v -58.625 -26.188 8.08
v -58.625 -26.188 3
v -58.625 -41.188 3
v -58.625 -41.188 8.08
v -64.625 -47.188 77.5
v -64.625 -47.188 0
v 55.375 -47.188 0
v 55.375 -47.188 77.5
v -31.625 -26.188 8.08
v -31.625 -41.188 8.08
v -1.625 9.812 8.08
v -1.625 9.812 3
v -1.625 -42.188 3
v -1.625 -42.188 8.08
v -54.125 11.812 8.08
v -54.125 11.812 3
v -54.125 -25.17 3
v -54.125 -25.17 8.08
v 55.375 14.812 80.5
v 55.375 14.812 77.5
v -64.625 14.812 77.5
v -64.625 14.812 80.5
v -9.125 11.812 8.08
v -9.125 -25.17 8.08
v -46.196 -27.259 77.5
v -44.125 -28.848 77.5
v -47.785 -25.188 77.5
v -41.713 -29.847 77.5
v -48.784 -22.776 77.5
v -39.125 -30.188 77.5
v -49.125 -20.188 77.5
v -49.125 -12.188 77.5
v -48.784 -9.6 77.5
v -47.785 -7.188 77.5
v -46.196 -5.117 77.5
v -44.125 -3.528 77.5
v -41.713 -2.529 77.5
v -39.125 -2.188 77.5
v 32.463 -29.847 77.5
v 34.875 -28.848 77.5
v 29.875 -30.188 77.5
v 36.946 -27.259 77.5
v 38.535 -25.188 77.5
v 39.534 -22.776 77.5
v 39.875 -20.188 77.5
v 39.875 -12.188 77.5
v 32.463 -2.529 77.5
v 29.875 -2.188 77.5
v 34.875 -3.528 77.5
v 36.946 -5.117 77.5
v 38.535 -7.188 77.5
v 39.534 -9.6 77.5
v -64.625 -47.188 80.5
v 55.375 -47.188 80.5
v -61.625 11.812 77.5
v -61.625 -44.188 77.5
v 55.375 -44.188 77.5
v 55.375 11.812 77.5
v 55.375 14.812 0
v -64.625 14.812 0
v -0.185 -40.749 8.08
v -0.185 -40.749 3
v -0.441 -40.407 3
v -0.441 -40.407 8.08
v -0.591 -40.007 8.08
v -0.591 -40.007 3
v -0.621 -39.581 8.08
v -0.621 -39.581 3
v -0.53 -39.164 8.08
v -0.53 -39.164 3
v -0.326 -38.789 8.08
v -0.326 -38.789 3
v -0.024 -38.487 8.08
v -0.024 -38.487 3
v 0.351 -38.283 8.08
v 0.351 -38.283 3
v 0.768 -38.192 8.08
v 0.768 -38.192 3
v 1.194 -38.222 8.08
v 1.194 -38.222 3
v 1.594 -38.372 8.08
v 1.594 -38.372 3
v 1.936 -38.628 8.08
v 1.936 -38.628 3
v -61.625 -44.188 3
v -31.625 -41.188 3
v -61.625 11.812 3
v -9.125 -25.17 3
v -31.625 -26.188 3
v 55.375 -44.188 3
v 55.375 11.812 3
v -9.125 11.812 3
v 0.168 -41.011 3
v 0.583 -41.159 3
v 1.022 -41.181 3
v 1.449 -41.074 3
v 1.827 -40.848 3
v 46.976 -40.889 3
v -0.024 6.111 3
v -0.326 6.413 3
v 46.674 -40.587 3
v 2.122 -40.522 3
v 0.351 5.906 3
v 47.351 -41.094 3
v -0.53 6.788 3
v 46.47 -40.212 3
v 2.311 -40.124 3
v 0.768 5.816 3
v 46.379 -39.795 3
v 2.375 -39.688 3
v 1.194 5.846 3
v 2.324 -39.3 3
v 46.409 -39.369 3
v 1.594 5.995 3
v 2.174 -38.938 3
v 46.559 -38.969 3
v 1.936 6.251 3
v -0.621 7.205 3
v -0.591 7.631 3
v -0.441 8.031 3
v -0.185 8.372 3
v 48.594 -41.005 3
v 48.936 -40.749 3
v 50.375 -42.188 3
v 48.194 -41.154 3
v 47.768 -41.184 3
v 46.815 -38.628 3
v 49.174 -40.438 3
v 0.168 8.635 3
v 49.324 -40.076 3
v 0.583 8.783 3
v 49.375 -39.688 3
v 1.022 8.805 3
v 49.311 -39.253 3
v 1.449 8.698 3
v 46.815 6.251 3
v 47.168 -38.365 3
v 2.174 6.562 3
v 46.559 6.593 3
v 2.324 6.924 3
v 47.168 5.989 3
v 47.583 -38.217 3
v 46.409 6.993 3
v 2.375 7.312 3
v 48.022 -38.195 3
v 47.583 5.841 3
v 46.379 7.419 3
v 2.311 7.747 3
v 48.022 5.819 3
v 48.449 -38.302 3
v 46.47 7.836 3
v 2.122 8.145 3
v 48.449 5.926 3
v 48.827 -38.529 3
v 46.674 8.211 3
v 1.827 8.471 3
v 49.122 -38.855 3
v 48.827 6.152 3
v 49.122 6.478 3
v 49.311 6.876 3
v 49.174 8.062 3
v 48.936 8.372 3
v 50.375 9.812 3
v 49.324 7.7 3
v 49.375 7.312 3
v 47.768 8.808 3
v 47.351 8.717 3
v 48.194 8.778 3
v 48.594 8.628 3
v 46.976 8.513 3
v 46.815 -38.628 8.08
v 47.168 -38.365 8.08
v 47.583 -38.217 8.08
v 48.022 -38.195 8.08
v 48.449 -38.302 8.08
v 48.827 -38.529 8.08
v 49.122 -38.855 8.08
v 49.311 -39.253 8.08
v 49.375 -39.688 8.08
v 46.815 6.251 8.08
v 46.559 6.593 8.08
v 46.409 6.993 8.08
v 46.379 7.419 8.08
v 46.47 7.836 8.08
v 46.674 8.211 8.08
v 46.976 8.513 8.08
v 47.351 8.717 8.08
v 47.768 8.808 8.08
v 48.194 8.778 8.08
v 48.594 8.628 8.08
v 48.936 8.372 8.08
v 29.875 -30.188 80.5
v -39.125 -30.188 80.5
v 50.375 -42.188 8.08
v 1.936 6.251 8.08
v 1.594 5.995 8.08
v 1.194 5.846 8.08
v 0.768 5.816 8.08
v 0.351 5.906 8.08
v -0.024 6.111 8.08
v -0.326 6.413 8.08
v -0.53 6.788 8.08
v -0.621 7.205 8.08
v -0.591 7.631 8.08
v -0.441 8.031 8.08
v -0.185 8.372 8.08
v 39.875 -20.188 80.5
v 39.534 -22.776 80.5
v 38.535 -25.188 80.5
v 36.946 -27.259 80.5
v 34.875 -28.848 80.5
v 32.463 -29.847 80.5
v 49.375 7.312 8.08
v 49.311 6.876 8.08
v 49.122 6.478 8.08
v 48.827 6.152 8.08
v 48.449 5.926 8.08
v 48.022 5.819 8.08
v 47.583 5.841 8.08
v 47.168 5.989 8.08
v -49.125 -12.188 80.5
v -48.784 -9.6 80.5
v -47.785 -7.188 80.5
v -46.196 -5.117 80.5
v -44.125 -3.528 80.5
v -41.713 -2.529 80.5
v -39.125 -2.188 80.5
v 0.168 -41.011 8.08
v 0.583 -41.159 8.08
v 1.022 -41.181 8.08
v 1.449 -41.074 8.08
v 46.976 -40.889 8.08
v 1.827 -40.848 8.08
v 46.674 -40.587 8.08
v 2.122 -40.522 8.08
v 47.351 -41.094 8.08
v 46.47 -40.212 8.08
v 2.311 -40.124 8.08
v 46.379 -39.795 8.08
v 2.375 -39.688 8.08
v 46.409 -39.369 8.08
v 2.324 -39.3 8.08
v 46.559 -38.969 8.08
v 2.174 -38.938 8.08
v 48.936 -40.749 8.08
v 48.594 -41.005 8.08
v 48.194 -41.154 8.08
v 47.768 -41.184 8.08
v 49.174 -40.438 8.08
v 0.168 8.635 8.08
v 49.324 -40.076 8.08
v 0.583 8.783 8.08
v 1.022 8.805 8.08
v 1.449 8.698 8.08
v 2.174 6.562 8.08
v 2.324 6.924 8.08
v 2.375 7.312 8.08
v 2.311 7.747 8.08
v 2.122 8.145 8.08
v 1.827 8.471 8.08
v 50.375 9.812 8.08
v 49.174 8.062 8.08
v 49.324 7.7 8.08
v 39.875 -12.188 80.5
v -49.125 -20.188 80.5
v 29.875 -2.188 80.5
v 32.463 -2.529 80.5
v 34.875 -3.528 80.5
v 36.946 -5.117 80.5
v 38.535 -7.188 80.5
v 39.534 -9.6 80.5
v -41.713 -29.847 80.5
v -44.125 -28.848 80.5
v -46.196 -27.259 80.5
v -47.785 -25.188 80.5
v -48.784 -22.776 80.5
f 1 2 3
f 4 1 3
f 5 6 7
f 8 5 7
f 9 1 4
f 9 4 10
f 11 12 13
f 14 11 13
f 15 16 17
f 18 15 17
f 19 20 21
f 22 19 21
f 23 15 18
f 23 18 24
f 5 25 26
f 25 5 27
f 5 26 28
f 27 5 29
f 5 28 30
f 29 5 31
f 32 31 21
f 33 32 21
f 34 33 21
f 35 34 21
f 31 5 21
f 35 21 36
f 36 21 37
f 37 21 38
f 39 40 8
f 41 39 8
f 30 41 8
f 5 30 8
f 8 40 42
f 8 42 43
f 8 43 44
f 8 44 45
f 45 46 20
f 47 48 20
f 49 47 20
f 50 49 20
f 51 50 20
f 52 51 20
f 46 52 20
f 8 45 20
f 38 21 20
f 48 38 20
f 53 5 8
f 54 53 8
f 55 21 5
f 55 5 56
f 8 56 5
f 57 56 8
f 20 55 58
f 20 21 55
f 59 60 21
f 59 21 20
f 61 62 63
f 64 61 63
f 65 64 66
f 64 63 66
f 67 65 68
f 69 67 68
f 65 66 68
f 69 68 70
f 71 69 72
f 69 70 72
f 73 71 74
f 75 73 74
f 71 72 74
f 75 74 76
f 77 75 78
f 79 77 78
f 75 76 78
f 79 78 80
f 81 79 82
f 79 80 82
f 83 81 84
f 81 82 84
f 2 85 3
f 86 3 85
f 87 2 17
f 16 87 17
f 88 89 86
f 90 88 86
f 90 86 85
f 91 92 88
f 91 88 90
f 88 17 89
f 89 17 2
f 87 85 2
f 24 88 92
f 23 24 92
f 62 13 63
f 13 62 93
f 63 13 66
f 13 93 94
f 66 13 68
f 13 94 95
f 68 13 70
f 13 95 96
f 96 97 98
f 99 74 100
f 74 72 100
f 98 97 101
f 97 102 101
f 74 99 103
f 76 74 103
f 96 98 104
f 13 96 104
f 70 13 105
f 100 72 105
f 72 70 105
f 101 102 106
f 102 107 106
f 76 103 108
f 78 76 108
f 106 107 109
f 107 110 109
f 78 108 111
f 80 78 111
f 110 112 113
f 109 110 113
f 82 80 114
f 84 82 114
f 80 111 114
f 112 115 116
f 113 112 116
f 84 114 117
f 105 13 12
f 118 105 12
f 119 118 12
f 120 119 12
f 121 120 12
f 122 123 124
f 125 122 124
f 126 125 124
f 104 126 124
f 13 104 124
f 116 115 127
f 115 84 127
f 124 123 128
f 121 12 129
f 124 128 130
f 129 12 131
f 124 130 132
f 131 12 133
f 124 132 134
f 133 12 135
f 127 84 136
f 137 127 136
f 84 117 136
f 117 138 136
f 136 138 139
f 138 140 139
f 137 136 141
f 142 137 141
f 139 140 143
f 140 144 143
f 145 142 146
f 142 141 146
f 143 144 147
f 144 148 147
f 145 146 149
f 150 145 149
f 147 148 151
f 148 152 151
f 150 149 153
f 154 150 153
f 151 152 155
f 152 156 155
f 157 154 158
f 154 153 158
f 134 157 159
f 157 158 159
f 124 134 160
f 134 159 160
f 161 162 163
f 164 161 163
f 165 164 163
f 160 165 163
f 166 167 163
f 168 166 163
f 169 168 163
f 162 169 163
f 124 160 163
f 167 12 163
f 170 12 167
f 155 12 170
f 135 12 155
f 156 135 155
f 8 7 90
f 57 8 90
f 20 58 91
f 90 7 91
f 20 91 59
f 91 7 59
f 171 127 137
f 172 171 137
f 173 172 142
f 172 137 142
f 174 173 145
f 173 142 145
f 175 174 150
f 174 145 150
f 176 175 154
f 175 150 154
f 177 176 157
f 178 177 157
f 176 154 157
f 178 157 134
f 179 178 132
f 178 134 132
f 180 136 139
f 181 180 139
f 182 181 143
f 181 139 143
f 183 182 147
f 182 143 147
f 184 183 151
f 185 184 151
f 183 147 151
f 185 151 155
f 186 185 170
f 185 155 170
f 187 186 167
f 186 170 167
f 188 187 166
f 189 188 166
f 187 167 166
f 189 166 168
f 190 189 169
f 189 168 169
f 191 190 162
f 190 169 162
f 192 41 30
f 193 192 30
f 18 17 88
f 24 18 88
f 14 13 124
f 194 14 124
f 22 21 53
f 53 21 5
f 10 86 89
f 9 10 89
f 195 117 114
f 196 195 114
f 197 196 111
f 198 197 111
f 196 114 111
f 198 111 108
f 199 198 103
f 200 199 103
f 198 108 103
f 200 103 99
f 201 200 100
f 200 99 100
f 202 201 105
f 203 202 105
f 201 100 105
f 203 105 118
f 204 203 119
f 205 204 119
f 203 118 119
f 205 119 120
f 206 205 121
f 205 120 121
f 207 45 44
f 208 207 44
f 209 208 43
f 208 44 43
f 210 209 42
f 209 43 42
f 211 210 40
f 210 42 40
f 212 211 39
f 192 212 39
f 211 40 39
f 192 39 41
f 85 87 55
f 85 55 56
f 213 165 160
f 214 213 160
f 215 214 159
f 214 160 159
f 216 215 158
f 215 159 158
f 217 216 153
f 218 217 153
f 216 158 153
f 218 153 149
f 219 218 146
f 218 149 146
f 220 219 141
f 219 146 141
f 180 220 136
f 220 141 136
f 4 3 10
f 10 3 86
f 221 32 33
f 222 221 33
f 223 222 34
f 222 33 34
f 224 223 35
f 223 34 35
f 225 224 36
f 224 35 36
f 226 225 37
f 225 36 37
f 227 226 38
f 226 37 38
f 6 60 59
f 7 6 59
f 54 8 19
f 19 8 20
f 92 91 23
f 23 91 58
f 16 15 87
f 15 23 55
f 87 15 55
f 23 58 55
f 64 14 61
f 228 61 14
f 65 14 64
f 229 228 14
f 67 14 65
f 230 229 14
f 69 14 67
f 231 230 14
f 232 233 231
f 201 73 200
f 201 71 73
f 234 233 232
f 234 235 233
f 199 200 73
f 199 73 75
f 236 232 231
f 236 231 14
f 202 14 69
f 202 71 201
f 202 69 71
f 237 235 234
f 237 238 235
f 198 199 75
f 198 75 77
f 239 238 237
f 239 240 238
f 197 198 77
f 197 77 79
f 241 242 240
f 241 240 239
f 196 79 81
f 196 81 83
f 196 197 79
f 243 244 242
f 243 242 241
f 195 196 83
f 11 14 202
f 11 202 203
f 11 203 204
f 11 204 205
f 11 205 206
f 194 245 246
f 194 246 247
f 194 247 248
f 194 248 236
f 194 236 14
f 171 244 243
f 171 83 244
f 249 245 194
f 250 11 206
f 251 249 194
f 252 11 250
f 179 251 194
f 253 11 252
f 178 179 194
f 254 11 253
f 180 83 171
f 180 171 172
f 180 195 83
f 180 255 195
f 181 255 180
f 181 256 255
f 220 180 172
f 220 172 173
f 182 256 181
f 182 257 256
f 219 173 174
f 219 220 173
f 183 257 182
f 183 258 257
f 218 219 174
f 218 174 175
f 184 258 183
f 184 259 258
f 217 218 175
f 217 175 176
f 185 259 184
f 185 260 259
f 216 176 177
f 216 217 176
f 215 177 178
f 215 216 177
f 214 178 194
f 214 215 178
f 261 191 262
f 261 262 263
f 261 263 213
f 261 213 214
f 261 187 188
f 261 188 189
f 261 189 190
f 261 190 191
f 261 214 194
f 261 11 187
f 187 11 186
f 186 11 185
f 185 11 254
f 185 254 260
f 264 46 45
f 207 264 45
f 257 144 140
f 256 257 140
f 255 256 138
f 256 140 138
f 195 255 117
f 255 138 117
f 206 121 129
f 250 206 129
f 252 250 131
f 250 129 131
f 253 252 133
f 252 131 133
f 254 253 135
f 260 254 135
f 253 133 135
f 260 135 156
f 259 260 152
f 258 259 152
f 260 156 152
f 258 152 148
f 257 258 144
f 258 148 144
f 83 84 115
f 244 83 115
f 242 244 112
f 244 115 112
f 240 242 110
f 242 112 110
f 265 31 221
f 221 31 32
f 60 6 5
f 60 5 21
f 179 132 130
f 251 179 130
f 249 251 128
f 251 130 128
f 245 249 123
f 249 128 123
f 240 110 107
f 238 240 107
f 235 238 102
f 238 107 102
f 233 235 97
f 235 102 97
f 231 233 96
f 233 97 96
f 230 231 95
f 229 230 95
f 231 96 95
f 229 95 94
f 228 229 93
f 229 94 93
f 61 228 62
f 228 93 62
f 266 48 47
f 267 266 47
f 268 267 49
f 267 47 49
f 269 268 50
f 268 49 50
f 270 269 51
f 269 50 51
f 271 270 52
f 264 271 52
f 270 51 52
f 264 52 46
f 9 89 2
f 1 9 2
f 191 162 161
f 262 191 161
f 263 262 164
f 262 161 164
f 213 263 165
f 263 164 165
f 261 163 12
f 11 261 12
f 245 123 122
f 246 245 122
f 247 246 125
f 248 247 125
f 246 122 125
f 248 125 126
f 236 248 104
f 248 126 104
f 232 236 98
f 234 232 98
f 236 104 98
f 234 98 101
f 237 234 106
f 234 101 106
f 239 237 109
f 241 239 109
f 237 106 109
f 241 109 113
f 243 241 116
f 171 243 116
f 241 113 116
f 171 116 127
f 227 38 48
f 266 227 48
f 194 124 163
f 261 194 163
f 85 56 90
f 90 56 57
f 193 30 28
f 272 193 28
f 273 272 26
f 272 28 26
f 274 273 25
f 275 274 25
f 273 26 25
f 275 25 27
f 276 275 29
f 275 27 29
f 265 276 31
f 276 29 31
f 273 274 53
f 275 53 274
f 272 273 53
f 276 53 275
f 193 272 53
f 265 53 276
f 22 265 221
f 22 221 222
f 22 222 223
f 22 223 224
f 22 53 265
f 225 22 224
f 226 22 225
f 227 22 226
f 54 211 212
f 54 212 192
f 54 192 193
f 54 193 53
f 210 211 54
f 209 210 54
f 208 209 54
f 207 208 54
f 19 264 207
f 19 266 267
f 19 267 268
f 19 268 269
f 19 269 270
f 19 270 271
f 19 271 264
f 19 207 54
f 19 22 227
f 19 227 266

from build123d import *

# Parameters (mm, degrees)
F0_W      = 120
F0_H      = 62
F1_DEPTH  = 77.5
F3_DEPTH  = 74.5
F5_DEPTH  = 3
F7_DEPTH  = 5.08
F9_DEPTH  = 5.08
F11_DEPTH = 5.08


with BuildPart() as f1:
    # F0 (on Top) → F1 (new body)
    with BuildSketch(Plane.XY):
        with Locations((-4.624794, -16.188201)):
            Rectangle(F0_W, F0_H)
    extrude(amount=F1_DEPTH)

    # F2 (on face) → F3 (cut)
    with BuildSketch(Plane.XY.offset(77.5)):
        Polygon((55.375206, -44.188201), (55.375206, 11.811799), (24.783194, 11.811799), (-61.624794, 11.811799), (-61.624794, -16.188201), (-61.624794, -44.188201), (24.551408, -44.188201), align=None)
    extrude(amount=-F3_DEPTH, mode=Mode.SUBTRACT)

    # F8 (on face) → F9 (join)
    with BuildSketch(Plane.XY.offset(3)):
        Polygon((-31.624794, -41.188201), (-31.624794, -26.188201), (-58.624794, -26.188201), (-58.624794, -33.688201), (-58.624794, -41.188201), (-45.124794, -41.188201), align=None)
    extrude(amount=F9_DEPTH)

    # F10 (on face) → F11 (join)
    with BuildSketch(Plane.XY.offset(3)):
        Polygon((-9.124794, -25.16969), (-9.124794, 11.811799), (-54.124794, 11.811799), (-54.124794, -6.66969), (-54.124794, -25.16969), align=None)
    extrude(amount=F11_DEPTH)


with BuildPart() as f5:
    # F4 (on face) → F5 (new body)
    with BuildSketch(Plane.XY.offset(77.5)):
        with BuildLine():
            Line((-21.697029, 14.811799), (-64.624794, 14.811799))
            Line((-64.624794, 14.811799), (-64.624794, -18.261954))
            Line((-64.624794, -18.261954), (-49.124794, -18.261954))
            Line((-49.124794, -18.261954), (-49.124794, -12.188201))
            ThreePointArc((-49.124794, -12.188201), (-46.195862, -5.117134), (-39.124794, -2.188201))
            Line((-39.124794, -2.188201), (-21.697029, -2.188201))
            Line((-21.697029, -2.188201), (-21.697029, 14.811799))
        make_face()
        with BuildLine():
            Line((55.375206, 14.811799), (-21.697029, 14.811799))
            Line((-21.697029, 14.811799), (-21.697029, -2.188201))
            Line((-21.697029, -2.188201), (29.875206, -2.188201))
            ThreePointArc((29.875206, -2.188201), (36.946274, -5.117134), (39.875206, -12.188201))
            Line((39.875206, -12.188201), (39.875206, -18.825031))
            Line((39.875206, -18.825031), (55.375206, -18.825031))
            Line((55.375206, -18.825031), (55.375206, 14.811799))
        make_face()
        with BuildLine():
            Line((55.375206, -47.188201), (55.375206, -18.825031))
            Line((55.375206, -18.825031), (39.875206, -18.825031))
            Line((39.875206, -18.825031), (39.875206, -20.188201))
            ThreePointArc((39.875206, -20.188201), (36.946274, -27.259269), (29.875206, -30.188201))
            Line((29.875206, -30.188201), (-20.468894, -30.188201))
            Line((-20.468894, -30.188201), (-20.468894, -47.188201))
            Line((-20.468894, -47.188201), (55.375206, -47.188201))
        make_face()
        with BuildLine():
            Line((-49.124794, -18.261954), (-64.624794, -18.261954))
            Line((-64.624794, -18.261954), (-64.624794, -47.188201))
            Line((-64.624794, -47.188201), (-20.468894, -47.188201))
            Line((-20.468894, -47.188201), (-20.468894, -30.188201))
            Line((-20.468894, -30.188201), (-39.124794, -30.188201))
            ThreePointArc((-39.124794, -30.188201), (-46.195862, -27.259269), (-49.124794, -20.188201))
            Line((-49.124794, -20.188201), (-49.124794, -18.261954))
        make_face()
    extrude(amount=F5_DEPTH)


with BuildPart() as f7:
    # F6 (on face) → F7 (new body)
    with BuildSketch(Plane.XY.offset(3)):
        with BuildLine():
            Line((50.375206, -13.575806), (50.375206, 9.811799))
            Line((50.375206, 9.811799), (48.935866, 8.372459))
            ThreePointArc((48.935866, 8.372459), (49.261025, 7.885824), (49.375206, 7.311799))
            ThreePointArc((49.375206, 7.311799), (48.449231, 5.925979), (46.814546, 6.251138))
            Line((46.814546, 6.251138), (45.375206, 4.811799))
            Line((45.375206, 4.811799), (45.375206, -37.188201))
            Line((45.375206, -37.188201), (46.814546, -38.627541))
            ThreePointArc((46.814546, -38.627541), (48.449231, -38.302382), (49.375206, -39.688201))
            ThreePointArc((49.375206, -39.688201), (49.261025, -40.262227), (48.935866, -40.748862))
            Line((48.935866, -40.748862), (50.375206, -42.188201))
            Line((50.375206, -42.188201), (50.375206, -13.575806))
        make_face()
        with BuildLine():
            Line((48.935866, 8.372459), (50.375206, 9.811799))
            Line((50.375206, 9.811799), (24.375206, 9.811799))
            Line((24.375206, 9.811799), (-1.624794, 9.811799))
            Line((-1.624794, 9.811799), (-0.185454, 8.372459))
            ThreePointArc((-0.185454, 8.372459), (1.449231, 8.697618), (2.375206, 7.311799))
            ThreePointArc((2.375206, 7.311799), (2.261025, 6.737773), (1.935866, 6.251138))
            Line((1.935866, 6.251138), (3.375206, 4.811799))
            Line((3.375206, 4.811799), (45.375206, 4.811799))
            Line((45.375206, 4.811799), (46.814546, 6.251138))
            ThreePointArc((46.814546, 6.251138), (46.814546, 8.372459), (48.935866, 8.372459))
        make_face()
        with BuildLine():
            Line((-0.185454, 8.372459), (-1.624794, 9.811799))
            Line((-1.624794, 9.811799), (-1.624794, -13.117866))
            Line((-1.624794, -13.117866), (3.375206, -13.117866))
            Line((3.375206, -13.117866), (3.375206, 4.811799))
            Line((3.375206, 4.811799), (1.935866, 6.251138))
            ThreePointArc((1.935866, 6.251138), (-0.185454, 6.251138), (-0.185454, 8.372459))
        make_face()
        with BuildLine():
            Line((3.375206, -13.117866), (-1.624794, -13.117866))
            Line((-1.624794, -13.117866), (-1.624794, -42.188201))
            Line((-1.624794, -42.188201), (-0.185454, -40.748862))
            ThreePointArc((-0.185454, -40.748862), (-0.185454, -38.627541), (1.935866, -38.627541))
            Line((1.935866, -38.627541), (3.375206, -37.188201))
            Line((3.375206, -37.188201), (3.375206, -13.117866))
        make_face()
        Polygon((45.375206, -37.188201), (45.375206, 4.811799), (3.375206, 4.811799), (3.375206, -13.117866), (3.375206, -37.188201), align=None)
        with BuildLine():
            Line((24.375206, -42.188201), (50.375206, -42.188201))
            Line((50.375206, -42.188201), (48.935866, -40.748862))
            ThreePointArc((48.935866, -40.748862), (46.814546, -40.748862), (46.814546, -38.627541))
            Line((46.814546, -38.627541), (45.375206, -37.188201))
            Line((45.375206, -37.188201), (3.375206, -37.188201))
            Line((3.375206, -37.188201), (1.935866, -38.627541))
            ThreePointArc((1.935866, -38.627541), (2.261025, -39.114176), (2.375206, -39.688201))
            ThreePointArc((2.375206, -39.688201), (1.449231, -41.074021), (-0.185454, -40.748862))
            Line((-0.185454, -40.748862), (-1.624794, -42.188201))
            Line((-1.624794, -42.188201), (24.375206, -42.188201))
        make_face()
    extrude(amount=F7_DEPTH)


solid = Compound([f1.part, f5.part, f7.part])
